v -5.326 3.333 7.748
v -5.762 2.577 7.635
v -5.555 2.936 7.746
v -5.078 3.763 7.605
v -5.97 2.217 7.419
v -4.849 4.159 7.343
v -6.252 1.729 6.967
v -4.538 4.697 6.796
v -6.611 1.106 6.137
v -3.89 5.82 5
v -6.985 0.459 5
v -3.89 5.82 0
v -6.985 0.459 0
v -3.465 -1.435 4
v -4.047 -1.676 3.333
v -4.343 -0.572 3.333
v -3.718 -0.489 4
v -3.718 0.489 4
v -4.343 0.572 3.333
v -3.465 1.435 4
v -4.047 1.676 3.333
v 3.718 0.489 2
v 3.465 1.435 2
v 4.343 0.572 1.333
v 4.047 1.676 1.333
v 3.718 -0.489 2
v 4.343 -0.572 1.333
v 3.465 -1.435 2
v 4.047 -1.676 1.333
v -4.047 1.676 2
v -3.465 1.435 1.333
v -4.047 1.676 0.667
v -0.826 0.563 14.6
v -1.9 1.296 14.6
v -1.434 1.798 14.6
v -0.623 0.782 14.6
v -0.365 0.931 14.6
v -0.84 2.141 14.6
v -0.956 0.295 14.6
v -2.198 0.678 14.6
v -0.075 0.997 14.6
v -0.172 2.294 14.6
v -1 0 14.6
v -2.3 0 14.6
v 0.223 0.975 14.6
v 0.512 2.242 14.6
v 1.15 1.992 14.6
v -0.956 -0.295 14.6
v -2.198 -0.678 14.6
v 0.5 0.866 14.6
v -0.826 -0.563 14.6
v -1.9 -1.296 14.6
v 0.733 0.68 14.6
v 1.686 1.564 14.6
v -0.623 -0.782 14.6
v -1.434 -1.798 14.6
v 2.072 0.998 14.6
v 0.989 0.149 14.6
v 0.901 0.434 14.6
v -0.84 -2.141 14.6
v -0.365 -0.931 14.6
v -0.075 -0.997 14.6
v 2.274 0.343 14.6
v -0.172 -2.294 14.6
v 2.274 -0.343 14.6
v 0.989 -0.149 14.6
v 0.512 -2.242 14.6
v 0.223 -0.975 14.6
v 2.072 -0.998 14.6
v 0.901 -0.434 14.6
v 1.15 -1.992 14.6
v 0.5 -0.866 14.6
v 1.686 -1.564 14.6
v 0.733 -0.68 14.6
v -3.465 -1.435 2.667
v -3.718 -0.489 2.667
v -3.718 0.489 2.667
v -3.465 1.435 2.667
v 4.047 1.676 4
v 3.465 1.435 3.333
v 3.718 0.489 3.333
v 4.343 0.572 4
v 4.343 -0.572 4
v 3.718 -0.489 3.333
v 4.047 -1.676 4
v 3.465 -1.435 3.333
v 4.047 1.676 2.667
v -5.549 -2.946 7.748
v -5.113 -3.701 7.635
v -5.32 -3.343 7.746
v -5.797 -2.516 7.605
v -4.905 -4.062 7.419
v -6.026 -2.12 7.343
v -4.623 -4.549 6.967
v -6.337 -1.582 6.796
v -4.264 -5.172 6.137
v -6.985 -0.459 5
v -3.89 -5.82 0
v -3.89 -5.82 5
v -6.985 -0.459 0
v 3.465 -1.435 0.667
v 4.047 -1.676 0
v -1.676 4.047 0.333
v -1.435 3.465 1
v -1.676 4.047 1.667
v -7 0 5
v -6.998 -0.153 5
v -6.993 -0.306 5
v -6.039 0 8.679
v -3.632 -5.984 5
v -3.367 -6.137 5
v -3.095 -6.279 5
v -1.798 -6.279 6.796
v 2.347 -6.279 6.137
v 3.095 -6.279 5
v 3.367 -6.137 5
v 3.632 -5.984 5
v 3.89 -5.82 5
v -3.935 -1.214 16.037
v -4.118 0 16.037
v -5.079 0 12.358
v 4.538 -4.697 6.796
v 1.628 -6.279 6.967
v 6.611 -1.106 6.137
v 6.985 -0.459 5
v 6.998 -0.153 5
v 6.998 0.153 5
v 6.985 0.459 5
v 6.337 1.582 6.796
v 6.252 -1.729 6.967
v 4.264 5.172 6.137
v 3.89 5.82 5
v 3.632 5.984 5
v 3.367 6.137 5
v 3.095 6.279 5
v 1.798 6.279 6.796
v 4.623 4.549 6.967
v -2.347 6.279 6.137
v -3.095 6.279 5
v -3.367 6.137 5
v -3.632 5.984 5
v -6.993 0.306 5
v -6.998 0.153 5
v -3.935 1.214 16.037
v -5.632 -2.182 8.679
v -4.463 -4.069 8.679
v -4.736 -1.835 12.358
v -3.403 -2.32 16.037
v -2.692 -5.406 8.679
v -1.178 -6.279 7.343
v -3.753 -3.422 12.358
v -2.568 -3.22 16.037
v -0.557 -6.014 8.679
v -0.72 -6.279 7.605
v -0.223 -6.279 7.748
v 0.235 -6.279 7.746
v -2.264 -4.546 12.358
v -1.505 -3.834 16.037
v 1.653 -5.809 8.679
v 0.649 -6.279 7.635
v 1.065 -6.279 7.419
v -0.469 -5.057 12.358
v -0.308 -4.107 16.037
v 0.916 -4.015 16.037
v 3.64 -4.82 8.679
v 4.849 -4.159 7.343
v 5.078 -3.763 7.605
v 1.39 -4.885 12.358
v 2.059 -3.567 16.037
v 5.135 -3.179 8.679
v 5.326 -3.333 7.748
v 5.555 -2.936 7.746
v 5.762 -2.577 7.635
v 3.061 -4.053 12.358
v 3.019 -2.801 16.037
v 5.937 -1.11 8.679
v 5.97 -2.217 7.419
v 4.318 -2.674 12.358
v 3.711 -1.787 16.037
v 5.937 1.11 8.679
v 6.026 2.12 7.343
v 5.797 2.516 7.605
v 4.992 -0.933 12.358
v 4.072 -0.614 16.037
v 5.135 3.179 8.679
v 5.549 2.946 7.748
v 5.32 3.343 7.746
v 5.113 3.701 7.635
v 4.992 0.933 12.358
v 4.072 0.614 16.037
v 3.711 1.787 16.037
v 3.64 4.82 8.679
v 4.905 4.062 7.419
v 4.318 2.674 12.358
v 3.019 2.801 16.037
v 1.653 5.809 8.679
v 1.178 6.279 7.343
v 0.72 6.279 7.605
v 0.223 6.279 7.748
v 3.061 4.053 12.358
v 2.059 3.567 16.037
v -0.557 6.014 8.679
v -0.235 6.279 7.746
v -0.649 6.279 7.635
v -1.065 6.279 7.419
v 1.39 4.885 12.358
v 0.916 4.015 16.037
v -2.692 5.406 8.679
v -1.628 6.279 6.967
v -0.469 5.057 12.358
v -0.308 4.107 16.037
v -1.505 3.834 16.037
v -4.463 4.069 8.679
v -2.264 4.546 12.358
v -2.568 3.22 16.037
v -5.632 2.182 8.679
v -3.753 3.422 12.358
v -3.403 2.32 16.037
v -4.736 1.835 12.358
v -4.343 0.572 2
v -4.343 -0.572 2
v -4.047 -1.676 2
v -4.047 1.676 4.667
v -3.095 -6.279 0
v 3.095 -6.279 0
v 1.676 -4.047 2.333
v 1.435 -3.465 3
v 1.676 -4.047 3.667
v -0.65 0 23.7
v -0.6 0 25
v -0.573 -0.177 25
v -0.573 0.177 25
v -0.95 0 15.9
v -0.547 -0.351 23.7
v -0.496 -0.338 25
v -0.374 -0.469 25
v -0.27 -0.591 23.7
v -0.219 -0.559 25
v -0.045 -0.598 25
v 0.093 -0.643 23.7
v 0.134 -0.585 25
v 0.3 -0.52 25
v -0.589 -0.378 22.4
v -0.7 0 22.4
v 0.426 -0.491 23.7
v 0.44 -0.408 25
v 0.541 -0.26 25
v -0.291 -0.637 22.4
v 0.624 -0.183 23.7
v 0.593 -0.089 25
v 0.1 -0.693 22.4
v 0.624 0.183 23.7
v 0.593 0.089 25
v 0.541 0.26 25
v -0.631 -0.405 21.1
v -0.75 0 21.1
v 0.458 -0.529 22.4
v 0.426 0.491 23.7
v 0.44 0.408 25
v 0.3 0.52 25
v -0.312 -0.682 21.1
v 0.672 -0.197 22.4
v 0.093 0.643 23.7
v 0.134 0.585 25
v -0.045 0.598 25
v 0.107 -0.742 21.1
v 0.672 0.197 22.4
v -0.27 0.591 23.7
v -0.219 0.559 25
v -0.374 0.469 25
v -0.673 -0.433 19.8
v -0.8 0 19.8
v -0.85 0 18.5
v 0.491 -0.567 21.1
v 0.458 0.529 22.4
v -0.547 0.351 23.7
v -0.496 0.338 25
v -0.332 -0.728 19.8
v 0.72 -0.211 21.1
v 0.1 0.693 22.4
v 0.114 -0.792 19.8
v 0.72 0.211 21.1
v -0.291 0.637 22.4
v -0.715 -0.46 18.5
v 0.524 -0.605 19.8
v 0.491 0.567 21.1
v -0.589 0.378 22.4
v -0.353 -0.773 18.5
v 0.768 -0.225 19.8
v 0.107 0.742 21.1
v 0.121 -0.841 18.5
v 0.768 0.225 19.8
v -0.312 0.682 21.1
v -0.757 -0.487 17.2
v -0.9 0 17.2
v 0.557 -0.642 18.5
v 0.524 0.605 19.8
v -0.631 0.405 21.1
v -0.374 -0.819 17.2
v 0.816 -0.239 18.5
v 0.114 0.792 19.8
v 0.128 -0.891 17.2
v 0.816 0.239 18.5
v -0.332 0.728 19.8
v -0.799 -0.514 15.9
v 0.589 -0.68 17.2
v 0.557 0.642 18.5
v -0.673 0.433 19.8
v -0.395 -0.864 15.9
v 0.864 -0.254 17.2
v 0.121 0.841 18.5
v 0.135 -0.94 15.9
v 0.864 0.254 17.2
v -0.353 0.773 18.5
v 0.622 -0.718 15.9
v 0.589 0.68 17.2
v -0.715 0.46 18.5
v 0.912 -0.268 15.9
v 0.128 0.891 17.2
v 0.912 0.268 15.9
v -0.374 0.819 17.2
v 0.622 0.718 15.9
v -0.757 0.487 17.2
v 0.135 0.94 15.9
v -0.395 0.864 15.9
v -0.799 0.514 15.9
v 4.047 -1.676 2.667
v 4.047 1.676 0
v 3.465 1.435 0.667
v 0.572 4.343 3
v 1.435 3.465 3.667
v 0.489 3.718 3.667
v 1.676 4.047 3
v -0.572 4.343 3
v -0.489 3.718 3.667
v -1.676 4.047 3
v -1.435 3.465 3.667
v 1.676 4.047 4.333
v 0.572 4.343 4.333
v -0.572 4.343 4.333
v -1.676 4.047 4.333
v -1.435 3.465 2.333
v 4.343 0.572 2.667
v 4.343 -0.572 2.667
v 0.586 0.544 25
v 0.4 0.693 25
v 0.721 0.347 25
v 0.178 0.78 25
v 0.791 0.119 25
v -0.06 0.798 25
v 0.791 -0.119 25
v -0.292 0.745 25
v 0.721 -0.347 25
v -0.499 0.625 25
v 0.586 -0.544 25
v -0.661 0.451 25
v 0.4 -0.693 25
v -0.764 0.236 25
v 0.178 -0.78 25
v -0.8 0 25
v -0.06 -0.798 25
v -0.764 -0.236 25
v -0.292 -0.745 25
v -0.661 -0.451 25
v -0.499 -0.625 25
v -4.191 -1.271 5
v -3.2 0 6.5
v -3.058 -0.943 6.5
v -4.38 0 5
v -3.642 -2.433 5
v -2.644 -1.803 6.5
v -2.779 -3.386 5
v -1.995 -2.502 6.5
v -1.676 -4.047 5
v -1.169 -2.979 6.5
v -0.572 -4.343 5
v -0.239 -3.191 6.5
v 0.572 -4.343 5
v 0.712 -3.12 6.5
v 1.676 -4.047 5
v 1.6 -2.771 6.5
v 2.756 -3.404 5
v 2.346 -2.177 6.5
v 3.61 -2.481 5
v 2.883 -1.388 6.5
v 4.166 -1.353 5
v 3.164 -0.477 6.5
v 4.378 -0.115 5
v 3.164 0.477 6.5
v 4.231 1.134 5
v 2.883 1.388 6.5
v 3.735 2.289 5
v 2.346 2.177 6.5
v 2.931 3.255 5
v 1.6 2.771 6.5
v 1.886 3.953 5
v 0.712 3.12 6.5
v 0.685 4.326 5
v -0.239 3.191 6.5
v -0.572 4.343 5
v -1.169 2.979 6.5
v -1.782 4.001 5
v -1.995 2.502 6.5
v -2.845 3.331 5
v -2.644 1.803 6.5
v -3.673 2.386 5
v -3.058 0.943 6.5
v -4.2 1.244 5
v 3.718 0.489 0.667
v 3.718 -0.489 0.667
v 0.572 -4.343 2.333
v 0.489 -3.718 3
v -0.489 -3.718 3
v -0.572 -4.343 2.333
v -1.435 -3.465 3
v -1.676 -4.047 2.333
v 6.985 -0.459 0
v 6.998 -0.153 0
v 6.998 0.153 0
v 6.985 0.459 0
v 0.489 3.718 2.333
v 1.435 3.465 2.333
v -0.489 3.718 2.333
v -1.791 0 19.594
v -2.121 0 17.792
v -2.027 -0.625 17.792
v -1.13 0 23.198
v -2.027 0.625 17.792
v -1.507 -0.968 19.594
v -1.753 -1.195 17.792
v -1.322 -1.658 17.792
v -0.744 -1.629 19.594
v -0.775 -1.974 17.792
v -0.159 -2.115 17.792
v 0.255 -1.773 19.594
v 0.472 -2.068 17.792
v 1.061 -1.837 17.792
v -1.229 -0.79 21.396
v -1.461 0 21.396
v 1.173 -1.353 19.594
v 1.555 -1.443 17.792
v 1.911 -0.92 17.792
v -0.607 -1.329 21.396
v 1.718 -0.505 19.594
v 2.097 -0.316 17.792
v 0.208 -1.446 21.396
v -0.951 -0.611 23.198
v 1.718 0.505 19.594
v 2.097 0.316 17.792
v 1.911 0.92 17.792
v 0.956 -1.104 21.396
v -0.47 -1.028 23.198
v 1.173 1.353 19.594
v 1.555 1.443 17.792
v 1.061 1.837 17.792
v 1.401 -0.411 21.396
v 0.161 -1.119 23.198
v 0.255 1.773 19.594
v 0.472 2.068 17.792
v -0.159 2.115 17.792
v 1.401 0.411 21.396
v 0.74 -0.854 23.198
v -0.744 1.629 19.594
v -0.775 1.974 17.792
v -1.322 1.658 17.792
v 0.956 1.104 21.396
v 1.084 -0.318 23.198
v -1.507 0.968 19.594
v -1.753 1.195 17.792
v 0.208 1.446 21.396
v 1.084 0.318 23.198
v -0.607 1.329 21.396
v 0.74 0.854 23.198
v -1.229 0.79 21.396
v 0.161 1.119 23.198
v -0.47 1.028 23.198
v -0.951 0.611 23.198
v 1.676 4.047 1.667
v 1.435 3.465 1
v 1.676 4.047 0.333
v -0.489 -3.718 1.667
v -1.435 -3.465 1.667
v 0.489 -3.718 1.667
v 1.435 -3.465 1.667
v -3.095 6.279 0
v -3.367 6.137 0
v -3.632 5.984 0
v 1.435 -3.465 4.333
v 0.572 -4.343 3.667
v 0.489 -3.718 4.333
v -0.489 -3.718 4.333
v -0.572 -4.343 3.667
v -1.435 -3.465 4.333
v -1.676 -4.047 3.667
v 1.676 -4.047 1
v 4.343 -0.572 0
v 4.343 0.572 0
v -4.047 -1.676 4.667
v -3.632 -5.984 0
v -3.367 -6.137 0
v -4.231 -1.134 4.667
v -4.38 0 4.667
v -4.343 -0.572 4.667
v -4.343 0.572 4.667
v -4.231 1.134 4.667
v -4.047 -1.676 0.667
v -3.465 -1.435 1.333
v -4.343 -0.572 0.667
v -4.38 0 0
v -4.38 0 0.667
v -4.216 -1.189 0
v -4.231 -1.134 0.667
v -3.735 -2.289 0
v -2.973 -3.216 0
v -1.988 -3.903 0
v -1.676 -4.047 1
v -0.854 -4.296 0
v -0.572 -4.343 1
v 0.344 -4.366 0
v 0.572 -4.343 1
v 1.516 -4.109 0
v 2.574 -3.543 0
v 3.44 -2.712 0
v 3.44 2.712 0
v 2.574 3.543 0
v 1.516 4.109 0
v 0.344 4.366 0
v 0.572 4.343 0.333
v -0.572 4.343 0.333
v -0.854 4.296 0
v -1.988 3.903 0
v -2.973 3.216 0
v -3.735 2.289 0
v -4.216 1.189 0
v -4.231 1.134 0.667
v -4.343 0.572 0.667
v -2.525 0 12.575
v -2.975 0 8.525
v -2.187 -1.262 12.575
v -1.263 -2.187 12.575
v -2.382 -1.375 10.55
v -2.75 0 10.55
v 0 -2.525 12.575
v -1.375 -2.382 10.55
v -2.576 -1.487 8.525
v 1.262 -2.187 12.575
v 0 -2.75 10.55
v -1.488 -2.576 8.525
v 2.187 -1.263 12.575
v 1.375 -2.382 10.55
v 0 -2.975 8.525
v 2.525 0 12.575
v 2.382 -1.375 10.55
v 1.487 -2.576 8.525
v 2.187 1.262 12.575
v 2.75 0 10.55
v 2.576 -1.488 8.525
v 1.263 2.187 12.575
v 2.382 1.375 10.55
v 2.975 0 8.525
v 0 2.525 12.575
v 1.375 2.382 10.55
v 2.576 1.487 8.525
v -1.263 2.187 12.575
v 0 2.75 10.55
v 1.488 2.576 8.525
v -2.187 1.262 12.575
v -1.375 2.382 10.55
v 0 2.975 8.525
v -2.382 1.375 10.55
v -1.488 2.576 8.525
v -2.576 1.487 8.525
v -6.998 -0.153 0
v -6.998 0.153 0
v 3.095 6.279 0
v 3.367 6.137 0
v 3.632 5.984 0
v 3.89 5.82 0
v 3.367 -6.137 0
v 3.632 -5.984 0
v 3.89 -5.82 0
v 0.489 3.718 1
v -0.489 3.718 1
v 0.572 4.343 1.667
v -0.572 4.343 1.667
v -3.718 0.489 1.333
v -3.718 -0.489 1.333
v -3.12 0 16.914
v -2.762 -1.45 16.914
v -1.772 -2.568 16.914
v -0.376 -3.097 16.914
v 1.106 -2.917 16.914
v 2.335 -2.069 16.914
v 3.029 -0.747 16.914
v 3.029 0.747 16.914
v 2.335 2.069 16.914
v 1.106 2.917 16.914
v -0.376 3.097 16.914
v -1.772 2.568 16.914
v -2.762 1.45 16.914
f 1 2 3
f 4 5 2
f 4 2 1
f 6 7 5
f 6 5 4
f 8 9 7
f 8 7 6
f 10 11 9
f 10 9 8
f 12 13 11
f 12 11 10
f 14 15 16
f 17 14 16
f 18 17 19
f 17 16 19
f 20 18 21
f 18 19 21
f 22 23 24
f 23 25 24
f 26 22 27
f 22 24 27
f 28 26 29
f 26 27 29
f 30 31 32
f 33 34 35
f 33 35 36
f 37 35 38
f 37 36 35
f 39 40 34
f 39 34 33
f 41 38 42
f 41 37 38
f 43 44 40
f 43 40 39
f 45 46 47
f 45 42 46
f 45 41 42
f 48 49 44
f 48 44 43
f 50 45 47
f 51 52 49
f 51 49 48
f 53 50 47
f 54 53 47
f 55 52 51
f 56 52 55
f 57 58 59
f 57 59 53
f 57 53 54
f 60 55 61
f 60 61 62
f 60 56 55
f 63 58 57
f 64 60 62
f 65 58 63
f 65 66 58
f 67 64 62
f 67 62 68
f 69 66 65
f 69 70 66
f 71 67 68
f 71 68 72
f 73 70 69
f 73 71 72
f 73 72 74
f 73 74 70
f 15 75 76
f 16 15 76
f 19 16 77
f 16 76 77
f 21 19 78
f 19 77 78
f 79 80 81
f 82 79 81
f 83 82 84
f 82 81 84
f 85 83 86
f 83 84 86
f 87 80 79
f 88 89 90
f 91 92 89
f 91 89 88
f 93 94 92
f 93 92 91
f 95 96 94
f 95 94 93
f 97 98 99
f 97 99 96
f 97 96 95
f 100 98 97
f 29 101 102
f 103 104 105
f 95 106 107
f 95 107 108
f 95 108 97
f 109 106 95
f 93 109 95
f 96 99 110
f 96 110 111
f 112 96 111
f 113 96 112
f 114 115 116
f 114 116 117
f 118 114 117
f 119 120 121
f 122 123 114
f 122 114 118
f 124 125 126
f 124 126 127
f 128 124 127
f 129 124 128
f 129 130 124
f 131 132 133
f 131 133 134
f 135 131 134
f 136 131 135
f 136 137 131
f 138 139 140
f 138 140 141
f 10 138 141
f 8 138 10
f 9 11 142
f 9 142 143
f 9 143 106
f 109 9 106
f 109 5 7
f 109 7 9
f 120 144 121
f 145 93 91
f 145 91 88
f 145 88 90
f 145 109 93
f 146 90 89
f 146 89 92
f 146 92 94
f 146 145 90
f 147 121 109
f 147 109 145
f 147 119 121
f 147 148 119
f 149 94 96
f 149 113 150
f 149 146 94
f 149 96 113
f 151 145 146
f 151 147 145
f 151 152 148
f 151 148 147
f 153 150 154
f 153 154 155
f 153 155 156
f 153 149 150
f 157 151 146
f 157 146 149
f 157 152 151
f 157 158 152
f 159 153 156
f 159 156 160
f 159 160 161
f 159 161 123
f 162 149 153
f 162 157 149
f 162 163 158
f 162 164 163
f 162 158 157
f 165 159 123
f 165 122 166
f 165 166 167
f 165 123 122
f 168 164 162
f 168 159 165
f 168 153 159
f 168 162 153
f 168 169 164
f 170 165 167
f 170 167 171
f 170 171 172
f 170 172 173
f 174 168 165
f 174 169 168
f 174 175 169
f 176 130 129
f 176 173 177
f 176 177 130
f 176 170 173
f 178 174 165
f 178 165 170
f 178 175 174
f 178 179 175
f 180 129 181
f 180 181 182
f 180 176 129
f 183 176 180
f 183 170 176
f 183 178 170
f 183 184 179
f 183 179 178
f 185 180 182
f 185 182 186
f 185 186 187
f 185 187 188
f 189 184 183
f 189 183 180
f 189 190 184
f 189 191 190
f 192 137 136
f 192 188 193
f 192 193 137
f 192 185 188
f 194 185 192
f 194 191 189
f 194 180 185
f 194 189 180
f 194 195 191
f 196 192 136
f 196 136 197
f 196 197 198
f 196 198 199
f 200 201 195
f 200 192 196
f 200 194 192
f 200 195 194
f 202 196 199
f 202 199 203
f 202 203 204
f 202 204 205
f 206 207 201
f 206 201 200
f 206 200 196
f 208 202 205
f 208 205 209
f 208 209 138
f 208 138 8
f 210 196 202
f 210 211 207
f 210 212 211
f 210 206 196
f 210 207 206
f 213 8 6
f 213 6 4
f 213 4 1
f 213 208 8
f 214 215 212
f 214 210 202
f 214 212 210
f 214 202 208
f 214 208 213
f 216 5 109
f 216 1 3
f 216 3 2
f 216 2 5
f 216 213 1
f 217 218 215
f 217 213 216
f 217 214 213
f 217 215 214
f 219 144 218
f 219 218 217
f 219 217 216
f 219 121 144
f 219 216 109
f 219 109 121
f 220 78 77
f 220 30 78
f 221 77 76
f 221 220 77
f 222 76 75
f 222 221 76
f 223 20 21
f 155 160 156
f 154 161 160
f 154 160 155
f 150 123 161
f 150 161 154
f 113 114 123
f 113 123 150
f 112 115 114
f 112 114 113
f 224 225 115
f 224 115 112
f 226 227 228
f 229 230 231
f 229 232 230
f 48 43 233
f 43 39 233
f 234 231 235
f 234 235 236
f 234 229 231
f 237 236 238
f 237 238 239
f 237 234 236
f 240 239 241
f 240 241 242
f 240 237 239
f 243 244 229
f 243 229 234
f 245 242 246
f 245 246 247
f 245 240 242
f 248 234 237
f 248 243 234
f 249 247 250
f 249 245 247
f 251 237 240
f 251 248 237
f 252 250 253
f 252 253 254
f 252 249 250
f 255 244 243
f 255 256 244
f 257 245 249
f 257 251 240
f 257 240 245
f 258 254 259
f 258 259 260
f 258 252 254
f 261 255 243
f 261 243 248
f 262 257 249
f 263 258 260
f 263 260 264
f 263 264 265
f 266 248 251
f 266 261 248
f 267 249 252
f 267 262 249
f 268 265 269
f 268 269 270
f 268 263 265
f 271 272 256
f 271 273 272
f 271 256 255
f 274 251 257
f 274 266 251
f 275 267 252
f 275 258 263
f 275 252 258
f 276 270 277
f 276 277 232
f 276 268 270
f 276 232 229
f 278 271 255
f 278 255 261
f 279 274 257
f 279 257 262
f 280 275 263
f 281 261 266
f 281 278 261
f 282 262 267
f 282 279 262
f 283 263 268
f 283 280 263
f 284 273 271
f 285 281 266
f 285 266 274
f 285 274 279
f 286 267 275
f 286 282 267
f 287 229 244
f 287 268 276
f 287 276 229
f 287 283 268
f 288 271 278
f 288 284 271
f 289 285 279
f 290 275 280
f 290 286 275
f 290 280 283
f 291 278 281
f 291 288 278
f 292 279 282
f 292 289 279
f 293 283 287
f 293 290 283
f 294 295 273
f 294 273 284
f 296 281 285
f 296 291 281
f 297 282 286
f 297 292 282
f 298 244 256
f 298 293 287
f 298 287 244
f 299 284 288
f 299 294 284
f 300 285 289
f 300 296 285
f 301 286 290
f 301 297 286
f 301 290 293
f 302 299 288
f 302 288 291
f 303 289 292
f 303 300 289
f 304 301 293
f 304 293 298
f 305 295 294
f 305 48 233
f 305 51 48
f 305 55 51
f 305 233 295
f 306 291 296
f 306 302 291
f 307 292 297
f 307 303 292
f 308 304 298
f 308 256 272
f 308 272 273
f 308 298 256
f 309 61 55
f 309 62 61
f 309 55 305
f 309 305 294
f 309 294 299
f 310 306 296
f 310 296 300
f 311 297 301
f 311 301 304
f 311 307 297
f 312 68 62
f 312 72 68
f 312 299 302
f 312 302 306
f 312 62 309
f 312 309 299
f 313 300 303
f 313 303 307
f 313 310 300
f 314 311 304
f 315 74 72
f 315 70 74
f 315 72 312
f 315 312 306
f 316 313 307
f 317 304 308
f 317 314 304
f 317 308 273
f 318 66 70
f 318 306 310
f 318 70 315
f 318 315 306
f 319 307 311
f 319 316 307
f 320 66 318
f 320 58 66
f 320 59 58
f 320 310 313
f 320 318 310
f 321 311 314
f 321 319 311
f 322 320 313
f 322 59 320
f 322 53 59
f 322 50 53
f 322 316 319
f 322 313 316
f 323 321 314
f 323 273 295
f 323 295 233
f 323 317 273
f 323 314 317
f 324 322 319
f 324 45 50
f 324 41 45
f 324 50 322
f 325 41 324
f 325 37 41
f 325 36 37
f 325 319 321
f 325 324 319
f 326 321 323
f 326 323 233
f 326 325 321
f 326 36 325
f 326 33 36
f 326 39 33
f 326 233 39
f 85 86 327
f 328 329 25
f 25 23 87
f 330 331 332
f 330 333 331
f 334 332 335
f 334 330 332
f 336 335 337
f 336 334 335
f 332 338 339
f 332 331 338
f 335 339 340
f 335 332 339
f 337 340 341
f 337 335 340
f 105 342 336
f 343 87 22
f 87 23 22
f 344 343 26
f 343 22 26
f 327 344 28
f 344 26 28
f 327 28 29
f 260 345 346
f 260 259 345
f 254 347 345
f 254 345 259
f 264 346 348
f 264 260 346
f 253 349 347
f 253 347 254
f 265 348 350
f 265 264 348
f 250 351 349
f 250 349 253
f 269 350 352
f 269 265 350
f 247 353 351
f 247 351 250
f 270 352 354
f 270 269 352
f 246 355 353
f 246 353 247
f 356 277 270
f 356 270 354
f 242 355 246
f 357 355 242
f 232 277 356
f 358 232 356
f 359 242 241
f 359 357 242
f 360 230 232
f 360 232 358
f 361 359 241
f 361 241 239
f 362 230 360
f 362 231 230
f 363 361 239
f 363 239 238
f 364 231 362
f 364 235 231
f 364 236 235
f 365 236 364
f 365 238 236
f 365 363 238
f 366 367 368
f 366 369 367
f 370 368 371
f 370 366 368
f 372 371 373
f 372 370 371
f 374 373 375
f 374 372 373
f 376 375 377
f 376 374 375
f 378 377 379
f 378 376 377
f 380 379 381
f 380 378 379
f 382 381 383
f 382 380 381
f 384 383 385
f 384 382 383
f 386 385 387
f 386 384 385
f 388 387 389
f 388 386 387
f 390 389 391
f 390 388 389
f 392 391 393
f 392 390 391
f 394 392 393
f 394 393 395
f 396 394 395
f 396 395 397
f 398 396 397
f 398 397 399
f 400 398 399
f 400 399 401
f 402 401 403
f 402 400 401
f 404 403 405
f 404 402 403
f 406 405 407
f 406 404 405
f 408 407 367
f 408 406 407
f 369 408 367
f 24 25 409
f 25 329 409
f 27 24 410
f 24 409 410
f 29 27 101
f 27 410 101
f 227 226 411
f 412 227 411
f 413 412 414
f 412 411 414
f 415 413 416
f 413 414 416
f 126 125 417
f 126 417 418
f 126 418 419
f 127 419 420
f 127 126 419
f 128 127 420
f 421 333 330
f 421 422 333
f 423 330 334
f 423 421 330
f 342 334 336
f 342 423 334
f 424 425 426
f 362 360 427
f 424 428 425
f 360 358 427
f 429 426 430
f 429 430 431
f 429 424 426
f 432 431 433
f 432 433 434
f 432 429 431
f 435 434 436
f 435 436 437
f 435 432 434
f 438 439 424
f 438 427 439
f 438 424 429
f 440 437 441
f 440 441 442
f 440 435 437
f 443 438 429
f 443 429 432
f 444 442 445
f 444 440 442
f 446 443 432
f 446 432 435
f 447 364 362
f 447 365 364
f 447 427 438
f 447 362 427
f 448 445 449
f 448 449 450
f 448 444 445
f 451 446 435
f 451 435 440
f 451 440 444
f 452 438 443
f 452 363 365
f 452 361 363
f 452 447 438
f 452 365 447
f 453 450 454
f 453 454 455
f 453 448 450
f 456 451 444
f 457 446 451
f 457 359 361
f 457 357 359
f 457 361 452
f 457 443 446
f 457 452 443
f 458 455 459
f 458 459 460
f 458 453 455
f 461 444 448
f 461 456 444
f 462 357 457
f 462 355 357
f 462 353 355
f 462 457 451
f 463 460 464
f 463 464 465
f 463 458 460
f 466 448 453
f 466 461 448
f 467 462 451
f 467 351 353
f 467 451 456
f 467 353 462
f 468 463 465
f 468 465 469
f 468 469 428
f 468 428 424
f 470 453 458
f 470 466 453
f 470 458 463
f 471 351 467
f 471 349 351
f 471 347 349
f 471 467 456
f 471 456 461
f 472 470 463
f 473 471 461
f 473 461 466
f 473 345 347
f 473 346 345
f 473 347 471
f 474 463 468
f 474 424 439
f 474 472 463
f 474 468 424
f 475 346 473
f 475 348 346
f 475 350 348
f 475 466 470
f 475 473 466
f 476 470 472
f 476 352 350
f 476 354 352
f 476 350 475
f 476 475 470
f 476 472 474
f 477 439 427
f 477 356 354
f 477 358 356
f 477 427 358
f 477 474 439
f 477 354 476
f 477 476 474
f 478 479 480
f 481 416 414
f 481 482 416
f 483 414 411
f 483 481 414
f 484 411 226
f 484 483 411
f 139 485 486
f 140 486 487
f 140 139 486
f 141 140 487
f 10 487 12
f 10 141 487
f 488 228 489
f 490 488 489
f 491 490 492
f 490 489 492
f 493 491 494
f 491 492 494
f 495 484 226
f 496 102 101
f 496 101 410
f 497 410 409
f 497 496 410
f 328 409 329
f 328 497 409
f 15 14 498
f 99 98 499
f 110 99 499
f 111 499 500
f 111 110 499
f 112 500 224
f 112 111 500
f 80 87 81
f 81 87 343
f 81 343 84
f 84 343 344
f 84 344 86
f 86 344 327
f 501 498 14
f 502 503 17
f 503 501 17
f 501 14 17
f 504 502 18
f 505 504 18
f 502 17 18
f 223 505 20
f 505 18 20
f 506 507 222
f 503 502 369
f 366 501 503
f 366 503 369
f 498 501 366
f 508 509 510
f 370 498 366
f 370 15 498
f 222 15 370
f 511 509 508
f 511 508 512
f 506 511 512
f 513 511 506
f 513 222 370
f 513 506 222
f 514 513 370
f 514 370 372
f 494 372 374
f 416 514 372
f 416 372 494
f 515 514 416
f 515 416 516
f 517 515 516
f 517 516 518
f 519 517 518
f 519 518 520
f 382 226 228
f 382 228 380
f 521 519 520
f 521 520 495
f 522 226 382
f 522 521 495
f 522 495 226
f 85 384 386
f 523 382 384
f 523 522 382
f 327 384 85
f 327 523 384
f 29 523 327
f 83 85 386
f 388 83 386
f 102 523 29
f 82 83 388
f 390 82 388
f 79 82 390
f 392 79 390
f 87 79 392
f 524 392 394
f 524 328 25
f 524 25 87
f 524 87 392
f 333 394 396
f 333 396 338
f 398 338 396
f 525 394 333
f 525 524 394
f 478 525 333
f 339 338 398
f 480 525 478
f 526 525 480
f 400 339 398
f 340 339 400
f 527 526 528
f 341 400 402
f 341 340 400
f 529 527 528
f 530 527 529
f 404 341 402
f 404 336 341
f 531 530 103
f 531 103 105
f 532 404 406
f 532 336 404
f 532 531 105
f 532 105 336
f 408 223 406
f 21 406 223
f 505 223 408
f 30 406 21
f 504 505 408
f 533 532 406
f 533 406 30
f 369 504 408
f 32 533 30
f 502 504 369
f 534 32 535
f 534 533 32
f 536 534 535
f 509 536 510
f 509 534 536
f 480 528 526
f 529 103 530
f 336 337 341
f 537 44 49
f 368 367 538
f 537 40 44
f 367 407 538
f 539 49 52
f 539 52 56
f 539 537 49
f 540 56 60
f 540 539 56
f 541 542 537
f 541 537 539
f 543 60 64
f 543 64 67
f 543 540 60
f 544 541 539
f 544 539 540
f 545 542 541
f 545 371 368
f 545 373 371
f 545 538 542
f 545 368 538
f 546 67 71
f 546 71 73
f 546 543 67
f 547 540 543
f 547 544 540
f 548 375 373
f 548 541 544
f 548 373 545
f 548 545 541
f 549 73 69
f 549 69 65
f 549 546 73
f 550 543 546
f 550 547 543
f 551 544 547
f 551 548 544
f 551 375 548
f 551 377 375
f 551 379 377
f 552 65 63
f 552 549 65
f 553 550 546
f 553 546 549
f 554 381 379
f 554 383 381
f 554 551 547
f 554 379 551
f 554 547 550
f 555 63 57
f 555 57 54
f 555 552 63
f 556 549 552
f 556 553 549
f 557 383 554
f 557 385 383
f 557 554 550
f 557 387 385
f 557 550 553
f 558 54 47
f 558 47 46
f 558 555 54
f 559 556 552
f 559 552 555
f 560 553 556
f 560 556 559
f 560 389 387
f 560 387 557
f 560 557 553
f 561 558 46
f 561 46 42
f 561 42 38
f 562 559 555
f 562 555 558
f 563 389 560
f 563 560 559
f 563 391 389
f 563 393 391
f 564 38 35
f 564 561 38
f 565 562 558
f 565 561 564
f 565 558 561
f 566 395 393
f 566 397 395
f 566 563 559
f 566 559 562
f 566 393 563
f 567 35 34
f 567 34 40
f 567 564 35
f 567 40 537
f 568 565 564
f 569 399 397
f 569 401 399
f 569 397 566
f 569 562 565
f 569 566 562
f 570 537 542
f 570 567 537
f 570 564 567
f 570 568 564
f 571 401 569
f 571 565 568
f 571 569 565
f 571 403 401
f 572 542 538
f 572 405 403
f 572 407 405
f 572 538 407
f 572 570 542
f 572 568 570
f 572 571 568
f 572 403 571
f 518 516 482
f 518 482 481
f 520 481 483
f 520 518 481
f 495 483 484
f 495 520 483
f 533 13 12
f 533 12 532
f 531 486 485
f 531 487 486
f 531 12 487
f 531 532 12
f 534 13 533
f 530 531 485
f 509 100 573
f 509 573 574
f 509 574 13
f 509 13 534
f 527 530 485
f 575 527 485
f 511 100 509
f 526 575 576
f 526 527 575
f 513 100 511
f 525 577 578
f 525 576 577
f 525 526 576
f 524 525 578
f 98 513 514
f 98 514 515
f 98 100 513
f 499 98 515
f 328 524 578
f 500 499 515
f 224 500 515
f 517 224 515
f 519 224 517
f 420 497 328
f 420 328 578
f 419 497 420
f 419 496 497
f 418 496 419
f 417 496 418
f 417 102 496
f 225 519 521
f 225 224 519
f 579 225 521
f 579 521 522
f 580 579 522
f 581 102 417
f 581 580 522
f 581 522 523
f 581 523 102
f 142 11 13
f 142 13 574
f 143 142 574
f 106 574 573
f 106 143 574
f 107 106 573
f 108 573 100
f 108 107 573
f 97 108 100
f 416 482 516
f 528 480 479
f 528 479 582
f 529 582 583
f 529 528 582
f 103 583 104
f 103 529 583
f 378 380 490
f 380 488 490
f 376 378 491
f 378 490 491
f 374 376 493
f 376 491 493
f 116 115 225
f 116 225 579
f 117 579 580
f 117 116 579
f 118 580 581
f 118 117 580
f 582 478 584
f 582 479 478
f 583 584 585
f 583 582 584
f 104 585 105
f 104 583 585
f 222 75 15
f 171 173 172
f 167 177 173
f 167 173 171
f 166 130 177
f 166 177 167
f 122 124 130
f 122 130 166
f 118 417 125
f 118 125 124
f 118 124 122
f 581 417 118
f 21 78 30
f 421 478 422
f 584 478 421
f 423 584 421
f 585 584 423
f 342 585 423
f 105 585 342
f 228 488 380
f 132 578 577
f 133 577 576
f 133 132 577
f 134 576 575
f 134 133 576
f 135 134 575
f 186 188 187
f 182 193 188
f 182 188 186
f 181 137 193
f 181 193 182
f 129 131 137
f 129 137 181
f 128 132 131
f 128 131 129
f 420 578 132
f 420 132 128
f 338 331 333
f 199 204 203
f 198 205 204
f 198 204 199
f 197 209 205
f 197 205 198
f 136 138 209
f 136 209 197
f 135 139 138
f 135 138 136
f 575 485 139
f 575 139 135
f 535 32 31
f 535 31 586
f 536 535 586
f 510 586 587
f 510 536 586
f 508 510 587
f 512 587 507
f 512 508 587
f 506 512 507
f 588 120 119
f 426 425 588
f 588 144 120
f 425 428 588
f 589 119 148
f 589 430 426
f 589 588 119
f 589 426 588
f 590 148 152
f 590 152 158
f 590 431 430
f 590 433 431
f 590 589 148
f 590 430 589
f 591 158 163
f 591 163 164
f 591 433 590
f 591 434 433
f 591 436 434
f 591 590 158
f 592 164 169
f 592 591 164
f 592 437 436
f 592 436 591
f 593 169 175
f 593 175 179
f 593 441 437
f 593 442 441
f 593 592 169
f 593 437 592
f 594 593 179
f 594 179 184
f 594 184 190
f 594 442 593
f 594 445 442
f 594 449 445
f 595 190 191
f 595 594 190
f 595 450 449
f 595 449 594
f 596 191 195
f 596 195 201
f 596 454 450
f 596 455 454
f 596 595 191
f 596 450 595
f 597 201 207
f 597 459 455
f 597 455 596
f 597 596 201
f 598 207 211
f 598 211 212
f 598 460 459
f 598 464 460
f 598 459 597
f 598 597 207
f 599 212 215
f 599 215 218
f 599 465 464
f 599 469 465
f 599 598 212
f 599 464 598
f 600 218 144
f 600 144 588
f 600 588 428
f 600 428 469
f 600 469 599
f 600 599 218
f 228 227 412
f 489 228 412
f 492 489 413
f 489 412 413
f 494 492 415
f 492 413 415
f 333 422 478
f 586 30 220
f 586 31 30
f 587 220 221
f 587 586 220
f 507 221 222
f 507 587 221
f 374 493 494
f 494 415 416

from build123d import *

# Parameters (mm, degrees)
SKETCH001_R         = 16.146195
POCKET_DEPTH        = 25.001
REVOLUTION001_ANGLE = 45
REVOLUTION002_ANGLE = 45


with BuildPart() as part:
    # Sketch → Revolution (revolve)
    with BuildSketch(Plane.XZ):
        Polygon((-1, 14.6), (-2.3, 14.6), (-3.2, 6.5), (-4.38, 5), (-4.38, 0), (-7, 0), (-7, 5), (-4.118425, 16.036616), (-2.121099, 17.791842), (-0.8, 25), (-0.6, 25), align=None)
    revolve(axis=Axis((0, 0, 0), (0, 0, 1)))

    # Sketch001 (on Face7 of Revolution) → Pocket (cut, through all)
    with BuildSketch(Plane(origin=(0, 0, 0), x_dir=(1, 0, 0), z_dir=(0, 0, -1))):
        Circle(SKETCH001_R)
        Polygon((-3.625, 6.278684), (-7.25, 0), (-3.625, -6.278684), (3.625, -6.278684), (7.25, 0), (3.625, 6.278684), align=None, mode=Mode.SUBTRACT)
    extrude(amount=-POCKET_DEPTH, mode=Mode.SUBTRACT)

    # Sketch002 → Revolution001 (revolve, symmetric)
    with BuildSketch(Plane.XZ) as revolution001_sk:
        Polygon((-4.88, 4.666667), (-4.38, 4.666667), (-3.75, 4), (-4.38, 3.333333), (-3.75, 2.666667), (-4.38, 2), (-3.75, 1.333333), (-4.38, 0.666667), (-4.88, 0.666667), align=None)
        Polygon((4.88, 0), (4.88, 4), (4.38, 4), (3.75, 3.333333), (4.38, 2.666667), (3.75, 2), (4.38, 1.333333), (3.75, 0.666667), (4.38, 0), align=None)
    revolve(axis=Axis((0, 0, 0), (0, 0, 1)), revolution_arc=REVOLUTION001_ANGLE / 2)
    revolve(revolution001_sk.sketch, axis=Axis((0, 0, 0), (0, 0, -1)), revolution_arc=REVOLUTION001_ANGLE / 2)

    # Sketch003 → Revolution002 (revolve, symmetric)
    with BuildSketch(Plane.YZ) as revolution002_sk:
        Polygon((-4.88, 5), (-4.38, 5), (-3.75, 4.333333), (-4.38, 3.666667), (-3.75, 3), (-4.38, 2.333333), (-3.75, 1.666667), (-4.38, 1), (-4.88, 1), align=None)
        Polygon((4.88, 0.333333), (4.88, 4.333333), (4.38, 4.333333), (3.75, 3.666667), (4.38, 3), (3.75, 2.333333), (4.38, 1.666667), (3.75, 1), (4.38, 0.333333), align=None)
    revolve(axis=Axis((0, 0, 0), (0, 0, 1)), revolution_arc=REVOLUTION002_ANGLE / 2)
    revolve(revolution002_sk.sketch, axis=Axis((0, 0, 0), (0, 0, -1)), revolution_arc=REVOLUTION002_ANGLE / 2)


solid = part.part
